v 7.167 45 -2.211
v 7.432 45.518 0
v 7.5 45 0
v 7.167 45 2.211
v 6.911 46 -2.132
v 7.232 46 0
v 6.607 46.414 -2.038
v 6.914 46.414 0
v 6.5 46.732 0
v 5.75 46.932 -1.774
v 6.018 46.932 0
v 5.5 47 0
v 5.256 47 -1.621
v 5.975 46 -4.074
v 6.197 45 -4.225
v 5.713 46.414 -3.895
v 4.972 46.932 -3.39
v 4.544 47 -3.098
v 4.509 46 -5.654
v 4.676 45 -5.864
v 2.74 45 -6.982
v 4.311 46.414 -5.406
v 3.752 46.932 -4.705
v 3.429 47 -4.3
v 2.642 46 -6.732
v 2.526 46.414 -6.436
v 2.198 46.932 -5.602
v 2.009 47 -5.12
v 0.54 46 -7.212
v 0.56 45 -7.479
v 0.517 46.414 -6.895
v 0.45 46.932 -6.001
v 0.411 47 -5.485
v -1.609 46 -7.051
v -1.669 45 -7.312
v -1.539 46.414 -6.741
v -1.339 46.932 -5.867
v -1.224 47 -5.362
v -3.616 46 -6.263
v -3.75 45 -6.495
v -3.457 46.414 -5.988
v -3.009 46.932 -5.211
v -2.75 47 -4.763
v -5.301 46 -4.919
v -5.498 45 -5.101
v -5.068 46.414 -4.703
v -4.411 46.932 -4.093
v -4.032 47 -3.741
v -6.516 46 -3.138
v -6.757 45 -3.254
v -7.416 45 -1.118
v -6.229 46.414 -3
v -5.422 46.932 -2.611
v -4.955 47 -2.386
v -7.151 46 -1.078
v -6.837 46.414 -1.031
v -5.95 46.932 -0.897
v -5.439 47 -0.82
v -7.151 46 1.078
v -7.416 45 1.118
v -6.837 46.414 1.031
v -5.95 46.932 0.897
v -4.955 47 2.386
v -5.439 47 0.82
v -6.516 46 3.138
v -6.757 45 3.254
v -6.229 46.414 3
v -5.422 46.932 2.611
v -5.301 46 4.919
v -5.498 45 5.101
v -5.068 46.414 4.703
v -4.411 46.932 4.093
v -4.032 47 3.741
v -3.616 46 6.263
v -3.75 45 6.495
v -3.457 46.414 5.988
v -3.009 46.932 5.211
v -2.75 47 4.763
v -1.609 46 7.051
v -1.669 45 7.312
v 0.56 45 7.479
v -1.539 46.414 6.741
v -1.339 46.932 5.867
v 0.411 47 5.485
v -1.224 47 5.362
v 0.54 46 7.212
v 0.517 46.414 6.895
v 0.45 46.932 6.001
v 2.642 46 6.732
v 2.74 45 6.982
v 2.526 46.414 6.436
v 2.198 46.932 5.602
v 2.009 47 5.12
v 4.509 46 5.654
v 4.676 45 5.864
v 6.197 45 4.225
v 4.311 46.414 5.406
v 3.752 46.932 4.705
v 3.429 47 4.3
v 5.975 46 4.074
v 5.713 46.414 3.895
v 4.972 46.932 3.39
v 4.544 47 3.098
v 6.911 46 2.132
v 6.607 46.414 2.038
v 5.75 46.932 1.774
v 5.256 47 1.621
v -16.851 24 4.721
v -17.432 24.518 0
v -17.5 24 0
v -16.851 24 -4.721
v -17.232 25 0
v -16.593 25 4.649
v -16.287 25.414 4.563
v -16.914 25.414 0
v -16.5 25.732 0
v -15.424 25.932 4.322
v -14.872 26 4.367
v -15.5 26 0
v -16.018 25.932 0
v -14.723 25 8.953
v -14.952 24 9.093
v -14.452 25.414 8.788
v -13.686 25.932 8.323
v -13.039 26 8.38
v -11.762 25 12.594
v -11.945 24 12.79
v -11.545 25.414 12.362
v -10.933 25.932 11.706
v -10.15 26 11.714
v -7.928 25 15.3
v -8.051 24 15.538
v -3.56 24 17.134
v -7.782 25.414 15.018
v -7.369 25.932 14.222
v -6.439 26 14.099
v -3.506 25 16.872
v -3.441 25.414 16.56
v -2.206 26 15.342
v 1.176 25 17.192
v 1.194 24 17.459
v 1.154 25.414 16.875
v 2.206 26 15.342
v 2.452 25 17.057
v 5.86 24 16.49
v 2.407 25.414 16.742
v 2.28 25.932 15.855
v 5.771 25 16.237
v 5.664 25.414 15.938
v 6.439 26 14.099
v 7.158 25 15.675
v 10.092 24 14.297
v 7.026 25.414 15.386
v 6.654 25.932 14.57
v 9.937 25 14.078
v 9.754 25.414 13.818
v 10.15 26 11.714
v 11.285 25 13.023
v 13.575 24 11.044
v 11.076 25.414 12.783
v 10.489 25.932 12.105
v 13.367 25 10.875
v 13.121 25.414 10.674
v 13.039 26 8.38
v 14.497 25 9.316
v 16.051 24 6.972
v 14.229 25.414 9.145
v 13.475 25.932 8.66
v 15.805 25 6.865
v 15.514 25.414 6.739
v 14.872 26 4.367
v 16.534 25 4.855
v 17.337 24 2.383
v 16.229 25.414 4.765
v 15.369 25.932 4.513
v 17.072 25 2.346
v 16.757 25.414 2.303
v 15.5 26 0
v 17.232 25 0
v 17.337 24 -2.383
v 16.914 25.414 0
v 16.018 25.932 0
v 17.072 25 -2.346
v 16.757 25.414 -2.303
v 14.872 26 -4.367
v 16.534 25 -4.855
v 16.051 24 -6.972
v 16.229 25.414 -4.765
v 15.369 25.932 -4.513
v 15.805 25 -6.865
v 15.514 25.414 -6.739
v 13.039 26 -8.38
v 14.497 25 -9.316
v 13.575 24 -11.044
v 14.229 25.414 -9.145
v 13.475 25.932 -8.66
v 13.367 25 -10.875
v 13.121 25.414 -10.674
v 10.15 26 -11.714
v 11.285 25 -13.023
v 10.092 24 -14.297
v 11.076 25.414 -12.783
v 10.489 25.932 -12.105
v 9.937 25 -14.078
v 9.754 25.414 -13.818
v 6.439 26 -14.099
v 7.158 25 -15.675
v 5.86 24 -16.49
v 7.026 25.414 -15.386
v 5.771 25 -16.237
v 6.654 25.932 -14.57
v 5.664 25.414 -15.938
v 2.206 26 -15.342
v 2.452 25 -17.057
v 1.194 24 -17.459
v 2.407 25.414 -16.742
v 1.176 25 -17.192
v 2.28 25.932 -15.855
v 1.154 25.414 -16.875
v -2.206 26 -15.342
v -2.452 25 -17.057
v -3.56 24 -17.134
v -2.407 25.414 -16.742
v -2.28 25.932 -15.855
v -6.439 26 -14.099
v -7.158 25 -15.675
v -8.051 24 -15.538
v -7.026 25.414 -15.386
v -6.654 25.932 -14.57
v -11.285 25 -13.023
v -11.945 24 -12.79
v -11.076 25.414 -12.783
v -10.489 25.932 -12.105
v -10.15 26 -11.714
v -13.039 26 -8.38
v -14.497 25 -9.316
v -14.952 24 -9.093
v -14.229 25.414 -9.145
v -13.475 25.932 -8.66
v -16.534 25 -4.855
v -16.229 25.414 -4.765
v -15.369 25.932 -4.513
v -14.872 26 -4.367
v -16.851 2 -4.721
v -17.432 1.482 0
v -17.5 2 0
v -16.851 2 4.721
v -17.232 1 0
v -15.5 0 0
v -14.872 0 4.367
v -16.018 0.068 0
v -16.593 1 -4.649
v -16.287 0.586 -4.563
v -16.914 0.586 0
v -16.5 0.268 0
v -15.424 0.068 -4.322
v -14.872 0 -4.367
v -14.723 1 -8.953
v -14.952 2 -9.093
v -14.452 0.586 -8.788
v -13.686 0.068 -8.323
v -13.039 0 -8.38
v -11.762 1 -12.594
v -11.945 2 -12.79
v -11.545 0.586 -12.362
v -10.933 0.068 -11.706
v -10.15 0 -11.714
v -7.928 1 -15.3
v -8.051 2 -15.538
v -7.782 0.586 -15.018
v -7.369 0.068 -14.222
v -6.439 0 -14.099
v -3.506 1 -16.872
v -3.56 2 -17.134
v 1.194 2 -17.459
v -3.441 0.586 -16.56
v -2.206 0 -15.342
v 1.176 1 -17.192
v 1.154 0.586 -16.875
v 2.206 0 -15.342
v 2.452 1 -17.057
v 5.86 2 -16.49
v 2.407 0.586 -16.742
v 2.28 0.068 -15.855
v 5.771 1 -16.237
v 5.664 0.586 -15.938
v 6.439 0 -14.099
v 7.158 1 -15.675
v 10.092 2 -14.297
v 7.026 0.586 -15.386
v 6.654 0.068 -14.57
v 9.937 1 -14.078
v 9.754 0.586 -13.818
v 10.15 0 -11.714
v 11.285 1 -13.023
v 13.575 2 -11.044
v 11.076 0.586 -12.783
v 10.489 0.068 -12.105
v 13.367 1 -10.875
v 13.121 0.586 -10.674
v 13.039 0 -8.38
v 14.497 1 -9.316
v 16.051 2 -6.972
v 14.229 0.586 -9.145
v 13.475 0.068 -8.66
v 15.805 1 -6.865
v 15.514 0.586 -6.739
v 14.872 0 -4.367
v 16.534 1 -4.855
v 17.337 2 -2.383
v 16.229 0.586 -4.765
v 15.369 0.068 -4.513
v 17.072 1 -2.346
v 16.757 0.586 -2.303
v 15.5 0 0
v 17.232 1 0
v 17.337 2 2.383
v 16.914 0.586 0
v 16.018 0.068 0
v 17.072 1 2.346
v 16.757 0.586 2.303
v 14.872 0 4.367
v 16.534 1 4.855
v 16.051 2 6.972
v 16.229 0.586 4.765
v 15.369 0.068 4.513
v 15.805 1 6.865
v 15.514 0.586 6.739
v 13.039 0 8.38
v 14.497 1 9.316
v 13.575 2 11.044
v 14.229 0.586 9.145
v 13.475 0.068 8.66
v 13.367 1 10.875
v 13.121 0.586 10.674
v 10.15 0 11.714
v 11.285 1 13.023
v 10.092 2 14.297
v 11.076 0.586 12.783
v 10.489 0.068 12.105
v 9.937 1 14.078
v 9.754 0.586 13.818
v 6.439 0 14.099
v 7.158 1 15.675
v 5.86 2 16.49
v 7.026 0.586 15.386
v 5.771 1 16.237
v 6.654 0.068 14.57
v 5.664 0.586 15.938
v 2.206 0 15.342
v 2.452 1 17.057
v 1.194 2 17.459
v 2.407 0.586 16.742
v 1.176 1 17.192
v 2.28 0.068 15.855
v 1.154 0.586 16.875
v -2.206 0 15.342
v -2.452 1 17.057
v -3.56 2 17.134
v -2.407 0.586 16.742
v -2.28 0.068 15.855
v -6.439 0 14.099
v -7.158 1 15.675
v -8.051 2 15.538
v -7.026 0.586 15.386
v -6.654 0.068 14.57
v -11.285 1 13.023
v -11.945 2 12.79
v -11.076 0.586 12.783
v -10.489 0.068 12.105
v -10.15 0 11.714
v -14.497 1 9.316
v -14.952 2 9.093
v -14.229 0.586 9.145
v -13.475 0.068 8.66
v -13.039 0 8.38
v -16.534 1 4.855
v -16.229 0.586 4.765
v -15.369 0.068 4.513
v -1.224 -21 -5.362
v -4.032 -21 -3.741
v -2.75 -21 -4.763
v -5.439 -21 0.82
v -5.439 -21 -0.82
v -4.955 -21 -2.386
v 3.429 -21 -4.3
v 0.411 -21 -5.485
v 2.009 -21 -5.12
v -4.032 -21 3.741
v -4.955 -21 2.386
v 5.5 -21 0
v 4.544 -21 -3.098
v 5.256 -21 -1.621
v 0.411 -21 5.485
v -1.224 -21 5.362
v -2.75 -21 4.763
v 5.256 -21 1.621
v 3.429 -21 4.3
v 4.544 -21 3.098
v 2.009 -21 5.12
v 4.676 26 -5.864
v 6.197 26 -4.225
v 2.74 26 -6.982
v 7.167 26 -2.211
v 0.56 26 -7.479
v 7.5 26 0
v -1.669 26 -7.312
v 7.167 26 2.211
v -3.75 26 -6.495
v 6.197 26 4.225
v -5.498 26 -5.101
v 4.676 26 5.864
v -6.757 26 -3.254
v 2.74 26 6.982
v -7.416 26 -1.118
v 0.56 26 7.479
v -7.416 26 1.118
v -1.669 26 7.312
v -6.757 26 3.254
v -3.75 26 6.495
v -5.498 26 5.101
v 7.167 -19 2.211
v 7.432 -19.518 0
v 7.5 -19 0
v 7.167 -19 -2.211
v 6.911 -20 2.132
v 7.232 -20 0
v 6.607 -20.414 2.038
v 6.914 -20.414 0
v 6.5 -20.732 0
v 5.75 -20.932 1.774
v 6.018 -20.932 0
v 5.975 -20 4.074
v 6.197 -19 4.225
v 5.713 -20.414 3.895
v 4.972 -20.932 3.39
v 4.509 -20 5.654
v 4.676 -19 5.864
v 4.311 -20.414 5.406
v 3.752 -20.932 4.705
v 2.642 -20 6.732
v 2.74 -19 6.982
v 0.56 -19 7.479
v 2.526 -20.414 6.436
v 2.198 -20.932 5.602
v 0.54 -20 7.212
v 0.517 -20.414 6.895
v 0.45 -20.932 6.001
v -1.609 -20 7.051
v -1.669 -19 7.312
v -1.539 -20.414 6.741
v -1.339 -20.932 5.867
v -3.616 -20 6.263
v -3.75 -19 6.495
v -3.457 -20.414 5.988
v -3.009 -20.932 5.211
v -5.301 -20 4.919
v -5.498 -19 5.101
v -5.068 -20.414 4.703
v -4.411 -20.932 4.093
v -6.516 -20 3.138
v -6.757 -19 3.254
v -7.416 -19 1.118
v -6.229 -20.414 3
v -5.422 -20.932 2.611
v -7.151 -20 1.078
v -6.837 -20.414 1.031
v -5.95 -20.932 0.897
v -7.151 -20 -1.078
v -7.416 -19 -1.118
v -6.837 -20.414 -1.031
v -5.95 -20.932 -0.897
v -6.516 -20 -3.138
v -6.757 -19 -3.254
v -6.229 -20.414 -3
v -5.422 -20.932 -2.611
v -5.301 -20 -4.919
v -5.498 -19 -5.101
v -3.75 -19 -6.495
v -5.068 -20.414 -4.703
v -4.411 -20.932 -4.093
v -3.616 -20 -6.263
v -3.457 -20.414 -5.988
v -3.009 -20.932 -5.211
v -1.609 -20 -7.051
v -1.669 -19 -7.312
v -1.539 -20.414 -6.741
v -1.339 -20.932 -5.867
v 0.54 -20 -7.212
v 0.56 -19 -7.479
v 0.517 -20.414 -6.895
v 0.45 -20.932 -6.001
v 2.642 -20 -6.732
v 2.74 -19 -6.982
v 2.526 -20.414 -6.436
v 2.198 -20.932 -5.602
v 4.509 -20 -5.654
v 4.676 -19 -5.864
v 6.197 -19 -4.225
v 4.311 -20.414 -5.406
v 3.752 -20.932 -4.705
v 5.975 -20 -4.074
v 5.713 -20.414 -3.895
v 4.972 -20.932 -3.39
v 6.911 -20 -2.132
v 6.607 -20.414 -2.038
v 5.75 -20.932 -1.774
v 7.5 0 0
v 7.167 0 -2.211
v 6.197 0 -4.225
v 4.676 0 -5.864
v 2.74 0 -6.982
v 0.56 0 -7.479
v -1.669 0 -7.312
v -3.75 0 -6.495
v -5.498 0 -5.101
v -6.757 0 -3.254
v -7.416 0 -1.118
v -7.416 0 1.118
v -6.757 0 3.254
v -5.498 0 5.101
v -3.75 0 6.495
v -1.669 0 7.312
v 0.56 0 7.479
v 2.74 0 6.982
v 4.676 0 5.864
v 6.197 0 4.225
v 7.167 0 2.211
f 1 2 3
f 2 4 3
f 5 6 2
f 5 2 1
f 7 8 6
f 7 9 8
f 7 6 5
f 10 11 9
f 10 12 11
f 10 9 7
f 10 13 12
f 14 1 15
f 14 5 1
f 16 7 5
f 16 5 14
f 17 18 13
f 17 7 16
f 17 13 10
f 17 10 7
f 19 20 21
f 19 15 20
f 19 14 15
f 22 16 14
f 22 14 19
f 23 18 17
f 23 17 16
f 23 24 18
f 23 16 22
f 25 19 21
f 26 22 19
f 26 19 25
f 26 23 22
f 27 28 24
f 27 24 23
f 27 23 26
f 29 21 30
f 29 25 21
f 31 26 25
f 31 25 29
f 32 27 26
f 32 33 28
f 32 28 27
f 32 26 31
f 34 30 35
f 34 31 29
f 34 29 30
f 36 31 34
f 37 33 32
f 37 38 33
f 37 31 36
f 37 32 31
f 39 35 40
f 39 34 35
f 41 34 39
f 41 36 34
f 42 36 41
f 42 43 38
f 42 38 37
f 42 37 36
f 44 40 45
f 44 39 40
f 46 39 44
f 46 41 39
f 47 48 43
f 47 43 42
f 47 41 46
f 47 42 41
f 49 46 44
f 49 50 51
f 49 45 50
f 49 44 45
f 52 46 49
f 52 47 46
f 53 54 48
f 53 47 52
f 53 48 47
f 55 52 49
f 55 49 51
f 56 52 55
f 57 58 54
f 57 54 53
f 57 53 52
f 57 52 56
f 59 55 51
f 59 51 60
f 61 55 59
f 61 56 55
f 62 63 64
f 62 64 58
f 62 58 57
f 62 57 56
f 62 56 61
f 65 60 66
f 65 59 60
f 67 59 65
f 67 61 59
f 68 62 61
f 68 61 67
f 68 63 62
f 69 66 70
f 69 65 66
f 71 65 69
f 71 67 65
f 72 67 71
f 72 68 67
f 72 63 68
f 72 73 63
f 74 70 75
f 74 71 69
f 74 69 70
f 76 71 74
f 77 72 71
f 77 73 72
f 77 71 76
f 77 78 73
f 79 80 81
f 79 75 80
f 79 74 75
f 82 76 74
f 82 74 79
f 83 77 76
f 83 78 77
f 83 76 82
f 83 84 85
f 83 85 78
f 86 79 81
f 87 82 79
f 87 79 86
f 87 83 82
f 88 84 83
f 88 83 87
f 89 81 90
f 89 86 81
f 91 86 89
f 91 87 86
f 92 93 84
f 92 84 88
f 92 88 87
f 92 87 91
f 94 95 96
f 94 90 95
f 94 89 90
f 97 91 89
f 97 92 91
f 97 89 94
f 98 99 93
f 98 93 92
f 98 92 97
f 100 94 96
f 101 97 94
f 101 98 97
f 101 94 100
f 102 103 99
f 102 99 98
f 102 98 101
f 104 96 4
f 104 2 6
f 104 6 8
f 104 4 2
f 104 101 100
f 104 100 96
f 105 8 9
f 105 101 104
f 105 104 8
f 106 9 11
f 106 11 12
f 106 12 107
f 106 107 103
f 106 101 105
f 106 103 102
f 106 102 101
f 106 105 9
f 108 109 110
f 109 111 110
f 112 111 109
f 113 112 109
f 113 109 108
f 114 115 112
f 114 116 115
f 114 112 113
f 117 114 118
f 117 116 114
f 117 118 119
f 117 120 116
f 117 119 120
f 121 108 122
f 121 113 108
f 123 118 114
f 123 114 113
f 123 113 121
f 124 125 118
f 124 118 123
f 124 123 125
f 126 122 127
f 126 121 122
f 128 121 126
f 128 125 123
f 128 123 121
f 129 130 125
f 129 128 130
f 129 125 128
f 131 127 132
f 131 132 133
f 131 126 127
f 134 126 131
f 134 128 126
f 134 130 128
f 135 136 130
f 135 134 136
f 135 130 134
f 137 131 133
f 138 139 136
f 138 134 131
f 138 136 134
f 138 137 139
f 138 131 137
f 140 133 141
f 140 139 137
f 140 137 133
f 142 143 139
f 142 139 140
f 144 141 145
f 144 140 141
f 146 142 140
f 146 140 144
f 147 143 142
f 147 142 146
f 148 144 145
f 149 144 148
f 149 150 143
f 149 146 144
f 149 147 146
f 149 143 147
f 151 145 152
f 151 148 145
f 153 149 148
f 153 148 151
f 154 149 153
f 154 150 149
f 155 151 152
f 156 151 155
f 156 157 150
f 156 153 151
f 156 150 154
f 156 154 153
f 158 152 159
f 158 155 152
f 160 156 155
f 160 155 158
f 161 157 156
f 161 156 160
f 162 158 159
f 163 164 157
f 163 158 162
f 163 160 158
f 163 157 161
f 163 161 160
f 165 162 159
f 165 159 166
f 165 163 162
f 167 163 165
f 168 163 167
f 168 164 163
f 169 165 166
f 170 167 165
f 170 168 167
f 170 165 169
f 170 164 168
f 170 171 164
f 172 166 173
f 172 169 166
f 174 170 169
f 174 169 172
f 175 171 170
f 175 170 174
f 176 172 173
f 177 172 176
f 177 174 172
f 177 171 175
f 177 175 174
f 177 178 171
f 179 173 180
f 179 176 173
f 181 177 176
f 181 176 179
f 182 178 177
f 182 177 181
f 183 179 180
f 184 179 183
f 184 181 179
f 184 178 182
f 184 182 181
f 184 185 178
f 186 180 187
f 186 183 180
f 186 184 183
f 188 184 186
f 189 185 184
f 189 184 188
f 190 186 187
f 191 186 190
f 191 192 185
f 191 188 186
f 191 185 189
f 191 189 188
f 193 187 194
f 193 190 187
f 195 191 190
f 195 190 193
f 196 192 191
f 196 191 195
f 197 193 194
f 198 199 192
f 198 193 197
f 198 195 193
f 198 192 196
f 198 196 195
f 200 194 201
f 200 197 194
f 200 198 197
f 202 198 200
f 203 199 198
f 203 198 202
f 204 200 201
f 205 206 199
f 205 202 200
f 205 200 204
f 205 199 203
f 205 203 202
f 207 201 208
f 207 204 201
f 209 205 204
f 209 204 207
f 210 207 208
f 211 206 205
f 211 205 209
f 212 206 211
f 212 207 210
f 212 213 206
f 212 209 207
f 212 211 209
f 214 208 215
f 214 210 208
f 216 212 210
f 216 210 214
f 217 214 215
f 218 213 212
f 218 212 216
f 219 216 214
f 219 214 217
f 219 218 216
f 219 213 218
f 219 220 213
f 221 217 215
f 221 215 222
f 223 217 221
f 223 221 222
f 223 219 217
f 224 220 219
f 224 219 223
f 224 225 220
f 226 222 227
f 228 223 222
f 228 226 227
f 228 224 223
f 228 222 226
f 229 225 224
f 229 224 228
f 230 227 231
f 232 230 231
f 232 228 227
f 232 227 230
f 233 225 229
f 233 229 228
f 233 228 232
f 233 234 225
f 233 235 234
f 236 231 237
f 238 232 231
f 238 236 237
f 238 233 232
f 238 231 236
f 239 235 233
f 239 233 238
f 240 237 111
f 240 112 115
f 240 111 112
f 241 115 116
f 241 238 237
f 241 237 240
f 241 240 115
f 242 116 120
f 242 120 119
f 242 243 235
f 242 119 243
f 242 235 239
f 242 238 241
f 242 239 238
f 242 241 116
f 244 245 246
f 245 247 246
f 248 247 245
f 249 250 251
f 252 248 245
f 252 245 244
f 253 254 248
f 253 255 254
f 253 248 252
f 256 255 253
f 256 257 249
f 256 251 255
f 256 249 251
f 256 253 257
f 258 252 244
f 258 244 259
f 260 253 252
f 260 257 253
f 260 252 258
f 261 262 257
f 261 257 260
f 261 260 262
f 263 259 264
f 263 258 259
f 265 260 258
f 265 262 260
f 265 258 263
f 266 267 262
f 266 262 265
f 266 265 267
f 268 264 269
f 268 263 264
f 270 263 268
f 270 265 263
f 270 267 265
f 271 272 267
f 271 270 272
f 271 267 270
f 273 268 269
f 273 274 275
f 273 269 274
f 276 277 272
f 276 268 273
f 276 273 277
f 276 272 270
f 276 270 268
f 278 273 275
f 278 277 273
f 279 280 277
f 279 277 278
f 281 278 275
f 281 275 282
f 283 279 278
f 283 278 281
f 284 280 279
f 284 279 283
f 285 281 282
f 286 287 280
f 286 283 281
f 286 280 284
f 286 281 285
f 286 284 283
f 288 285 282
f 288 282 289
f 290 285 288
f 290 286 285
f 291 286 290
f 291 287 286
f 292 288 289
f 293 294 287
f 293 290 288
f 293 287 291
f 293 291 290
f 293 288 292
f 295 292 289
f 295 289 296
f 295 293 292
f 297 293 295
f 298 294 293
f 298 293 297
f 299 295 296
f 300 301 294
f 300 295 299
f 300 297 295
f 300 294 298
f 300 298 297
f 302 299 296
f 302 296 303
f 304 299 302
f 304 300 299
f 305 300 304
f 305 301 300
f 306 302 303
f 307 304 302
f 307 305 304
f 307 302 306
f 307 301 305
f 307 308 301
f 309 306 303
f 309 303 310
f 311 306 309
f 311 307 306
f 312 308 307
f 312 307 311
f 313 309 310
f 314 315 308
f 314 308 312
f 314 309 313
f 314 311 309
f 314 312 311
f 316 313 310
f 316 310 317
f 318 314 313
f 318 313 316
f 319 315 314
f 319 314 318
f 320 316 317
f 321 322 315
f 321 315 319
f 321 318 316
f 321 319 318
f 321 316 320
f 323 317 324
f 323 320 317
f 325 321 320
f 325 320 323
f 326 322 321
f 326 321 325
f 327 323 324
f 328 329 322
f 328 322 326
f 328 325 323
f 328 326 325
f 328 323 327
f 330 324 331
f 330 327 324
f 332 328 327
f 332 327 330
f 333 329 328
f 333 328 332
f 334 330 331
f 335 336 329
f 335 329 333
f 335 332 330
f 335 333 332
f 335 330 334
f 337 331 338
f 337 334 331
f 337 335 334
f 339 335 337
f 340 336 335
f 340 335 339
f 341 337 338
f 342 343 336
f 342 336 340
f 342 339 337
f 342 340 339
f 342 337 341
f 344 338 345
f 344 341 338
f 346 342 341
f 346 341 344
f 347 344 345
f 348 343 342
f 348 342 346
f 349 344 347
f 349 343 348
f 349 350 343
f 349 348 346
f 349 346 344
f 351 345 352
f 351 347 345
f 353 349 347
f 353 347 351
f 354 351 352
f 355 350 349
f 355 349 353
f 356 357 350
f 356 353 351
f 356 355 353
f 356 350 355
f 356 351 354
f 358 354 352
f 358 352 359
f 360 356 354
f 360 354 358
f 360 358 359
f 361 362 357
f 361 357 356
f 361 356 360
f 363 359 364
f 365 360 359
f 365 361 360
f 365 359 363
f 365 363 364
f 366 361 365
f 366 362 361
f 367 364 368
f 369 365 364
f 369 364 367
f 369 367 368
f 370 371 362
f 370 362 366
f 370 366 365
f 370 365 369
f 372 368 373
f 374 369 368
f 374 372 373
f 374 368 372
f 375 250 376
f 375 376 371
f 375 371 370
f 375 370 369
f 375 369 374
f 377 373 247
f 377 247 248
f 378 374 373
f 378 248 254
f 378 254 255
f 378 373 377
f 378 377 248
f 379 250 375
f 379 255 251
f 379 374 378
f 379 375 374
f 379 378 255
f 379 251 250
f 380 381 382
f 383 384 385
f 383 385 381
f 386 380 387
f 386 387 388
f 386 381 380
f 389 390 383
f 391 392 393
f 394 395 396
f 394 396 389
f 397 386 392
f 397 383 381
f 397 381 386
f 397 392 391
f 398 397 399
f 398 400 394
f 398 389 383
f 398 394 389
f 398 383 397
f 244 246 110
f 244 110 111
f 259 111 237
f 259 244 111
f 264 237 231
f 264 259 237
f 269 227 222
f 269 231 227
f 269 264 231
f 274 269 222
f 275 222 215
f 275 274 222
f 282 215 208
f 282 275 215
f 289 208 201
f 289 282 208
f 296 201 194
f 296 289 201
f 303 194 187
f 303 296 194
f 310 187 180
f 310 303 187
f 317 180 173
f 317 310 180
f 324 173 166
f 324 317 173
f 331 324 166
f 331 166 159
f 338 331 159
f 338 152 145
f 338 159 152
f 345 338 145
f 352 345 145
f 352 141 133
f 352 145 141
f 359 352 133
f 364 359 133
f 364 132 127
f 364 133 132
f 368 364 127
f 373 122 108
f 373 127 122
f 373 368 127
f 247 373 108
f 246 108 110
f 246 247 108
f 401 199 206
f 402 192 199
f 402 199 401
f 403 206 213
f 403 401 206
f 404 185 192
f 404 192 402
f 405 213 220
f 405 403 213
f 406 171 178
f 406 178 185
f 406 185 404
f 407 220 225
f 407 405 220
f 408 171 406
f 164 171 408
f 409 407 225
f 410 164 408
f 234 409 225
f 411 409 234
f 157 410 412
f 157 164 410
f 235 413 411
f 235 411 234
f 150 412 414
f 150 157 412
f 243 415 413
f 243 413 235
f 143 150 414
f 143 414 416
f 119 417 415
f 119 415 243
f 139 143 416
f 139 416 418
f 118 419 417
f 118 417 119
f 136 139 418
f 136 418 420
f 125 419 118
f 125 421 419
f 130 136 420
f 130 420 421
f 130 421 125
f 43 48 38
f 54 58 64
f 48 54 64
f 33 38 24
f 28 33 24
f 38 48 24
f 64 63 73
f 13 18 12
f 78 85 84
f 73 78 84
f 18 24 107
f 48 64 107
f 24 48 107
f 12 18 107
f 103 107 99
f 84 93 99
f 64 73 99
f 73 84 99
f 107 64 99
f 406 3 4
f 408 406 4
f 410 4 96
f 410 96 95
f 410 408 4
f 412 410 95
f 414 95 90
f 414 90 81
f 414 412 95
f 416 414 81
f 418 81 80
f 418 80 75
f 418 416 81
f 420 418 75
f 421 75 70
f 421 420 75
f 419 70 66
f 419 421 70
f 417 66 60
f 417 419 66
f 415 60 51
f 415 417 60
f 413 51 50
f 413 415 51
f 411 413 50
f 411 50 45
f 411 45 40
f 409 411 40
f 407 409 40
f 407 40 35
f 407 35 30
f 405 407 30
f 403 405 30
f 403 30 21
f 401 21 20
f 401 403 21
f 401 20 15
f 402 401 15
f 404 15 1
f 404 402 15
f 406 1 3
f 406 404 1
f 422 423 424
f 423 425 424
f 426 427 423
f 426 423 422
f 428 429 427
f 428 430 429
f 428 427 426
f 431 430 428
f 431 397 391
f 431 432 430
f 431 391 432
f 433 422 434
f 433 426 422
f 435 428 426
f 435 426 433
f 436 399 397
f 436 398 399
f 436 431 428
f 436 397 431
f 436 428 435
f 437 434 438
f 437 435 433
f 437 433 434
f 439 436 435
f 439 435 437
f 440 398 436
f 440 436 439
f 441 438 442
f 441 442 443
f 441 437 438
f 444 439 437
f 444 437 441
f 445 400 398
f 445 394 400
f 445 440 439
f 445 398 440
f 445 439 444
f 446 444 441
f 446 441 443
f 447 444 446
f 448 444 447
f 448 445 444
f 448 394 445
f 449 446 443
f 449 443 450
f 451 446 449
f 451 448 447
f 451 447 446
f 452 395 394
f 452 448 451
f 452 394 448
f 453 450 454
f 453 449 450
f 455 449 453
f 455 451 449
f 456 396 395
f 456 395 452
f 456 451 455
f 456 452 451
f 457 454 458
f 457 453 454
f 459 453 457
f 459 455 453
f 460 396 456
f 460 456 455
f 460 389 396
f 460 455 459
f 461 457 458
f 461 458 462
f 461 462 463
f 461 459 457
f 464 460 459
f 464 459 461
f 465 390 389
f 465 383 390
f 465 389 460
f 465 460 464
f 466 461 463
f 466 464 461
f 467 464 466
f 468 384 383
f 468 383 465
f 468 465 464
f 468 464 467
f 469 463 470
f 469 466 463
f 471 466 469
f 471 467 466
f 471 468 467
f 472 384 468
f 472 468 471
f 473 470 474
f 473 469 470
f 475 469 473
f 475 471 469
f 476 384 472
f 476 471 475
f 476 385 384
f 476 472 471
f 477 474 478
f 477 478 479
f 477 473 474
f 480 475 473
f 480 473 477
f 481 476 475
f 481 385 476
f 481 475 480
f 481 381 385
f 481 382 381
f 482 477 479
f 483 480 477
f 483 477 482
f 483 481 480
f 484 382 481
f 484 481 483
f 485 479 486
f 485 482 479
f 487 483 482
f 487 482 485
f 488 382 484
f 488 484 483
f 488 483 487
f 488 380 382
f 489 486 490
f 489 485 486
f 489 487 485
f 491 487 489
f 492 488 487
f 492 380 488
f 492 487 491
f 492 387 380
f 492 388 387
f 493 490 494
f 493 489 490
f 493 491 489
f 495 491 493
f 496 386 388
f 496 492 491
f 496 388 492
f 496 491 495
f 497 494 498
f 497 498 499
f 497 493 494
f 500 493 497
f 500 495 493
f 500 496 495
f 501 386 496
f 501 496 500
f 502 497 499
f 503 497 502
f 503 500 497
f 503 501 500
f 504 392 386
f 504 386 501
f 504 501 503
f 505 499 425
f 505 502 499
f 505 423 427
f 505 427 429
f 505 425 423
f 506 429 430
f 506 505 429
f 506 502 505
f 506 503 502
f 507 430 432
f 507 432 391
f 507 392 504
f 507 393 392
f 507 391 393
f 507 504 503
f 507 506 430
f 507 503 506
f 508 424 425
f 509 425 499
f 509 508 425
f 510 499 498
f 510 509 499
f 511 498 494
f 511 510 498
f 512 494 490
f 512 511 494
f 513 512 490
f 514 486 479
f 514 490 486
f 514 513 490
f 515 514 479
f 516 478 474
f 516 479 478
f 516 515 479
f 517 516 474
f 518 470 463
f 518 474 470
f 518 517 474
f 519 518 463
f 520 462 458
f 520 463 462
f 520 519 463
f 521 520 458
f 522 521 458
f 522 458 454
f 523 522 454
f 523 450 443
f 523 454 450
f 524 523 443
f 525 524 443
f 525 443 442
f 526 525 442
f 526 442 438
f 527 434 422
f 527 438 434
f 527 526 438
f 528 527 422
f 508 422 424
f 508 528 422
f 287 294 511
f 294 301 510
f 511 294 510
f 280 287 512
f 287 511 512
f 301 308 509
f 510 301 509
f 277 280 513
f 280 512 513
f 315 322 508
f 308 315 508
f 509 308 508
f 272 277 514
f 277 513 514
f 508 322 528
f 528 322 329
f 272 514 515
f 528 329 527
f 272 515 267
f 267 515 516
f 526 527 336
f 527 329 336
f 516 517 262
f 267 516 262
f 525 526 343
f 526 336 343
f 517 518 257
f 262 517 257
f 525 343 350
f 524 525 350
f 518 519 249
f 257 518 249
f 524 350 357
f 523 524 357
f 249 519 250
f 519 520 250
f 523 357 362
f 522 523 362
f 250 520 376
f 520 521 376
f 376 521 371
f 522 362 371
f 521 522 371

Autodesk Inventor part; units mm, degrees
ref_plane "YZ Plane" through (0, 0, 0) normal (1, 0, 0) x (0, 1, 0)
ref_plane "XZ Plane" through (0, 0, 0) normal (0, 1, 0) x (-1, 0, 0)
ref_plane "XY Plane" through (0, 0, 0) normal (0, 0, 1) x (1, 0, 0)
sketch "Sketch1" plane through (0, 0, 0) normal (0, 1, 0) x (-1, 0, 0)
  circle A0 centre (0, 0) radius 17.5
  circle A1 centre (0, 0) radius 7.5
  dimension "d0" = 35
  dimension "d1" = 15
extrude "Extrusion1" add sketch "Sketch1" along normal blind 26
sketch "Sketch2" plane through (0, 0, 0) normal (0, -1, 0) x (1, 0, 0)
  circle A0 centre (0, 0) radius 7.5 projected
extrude "Extrusion2" add sketch "Sketch2" along normal blind 21 and the other way blind 47
fillet "Fillet1" radius 2 4 edges at (17.5, 26, 0) (17.5, 0, 0) (-7.5, 47, 0) (-7.5, -21, 0)
properties part number "Amostra_v1"
